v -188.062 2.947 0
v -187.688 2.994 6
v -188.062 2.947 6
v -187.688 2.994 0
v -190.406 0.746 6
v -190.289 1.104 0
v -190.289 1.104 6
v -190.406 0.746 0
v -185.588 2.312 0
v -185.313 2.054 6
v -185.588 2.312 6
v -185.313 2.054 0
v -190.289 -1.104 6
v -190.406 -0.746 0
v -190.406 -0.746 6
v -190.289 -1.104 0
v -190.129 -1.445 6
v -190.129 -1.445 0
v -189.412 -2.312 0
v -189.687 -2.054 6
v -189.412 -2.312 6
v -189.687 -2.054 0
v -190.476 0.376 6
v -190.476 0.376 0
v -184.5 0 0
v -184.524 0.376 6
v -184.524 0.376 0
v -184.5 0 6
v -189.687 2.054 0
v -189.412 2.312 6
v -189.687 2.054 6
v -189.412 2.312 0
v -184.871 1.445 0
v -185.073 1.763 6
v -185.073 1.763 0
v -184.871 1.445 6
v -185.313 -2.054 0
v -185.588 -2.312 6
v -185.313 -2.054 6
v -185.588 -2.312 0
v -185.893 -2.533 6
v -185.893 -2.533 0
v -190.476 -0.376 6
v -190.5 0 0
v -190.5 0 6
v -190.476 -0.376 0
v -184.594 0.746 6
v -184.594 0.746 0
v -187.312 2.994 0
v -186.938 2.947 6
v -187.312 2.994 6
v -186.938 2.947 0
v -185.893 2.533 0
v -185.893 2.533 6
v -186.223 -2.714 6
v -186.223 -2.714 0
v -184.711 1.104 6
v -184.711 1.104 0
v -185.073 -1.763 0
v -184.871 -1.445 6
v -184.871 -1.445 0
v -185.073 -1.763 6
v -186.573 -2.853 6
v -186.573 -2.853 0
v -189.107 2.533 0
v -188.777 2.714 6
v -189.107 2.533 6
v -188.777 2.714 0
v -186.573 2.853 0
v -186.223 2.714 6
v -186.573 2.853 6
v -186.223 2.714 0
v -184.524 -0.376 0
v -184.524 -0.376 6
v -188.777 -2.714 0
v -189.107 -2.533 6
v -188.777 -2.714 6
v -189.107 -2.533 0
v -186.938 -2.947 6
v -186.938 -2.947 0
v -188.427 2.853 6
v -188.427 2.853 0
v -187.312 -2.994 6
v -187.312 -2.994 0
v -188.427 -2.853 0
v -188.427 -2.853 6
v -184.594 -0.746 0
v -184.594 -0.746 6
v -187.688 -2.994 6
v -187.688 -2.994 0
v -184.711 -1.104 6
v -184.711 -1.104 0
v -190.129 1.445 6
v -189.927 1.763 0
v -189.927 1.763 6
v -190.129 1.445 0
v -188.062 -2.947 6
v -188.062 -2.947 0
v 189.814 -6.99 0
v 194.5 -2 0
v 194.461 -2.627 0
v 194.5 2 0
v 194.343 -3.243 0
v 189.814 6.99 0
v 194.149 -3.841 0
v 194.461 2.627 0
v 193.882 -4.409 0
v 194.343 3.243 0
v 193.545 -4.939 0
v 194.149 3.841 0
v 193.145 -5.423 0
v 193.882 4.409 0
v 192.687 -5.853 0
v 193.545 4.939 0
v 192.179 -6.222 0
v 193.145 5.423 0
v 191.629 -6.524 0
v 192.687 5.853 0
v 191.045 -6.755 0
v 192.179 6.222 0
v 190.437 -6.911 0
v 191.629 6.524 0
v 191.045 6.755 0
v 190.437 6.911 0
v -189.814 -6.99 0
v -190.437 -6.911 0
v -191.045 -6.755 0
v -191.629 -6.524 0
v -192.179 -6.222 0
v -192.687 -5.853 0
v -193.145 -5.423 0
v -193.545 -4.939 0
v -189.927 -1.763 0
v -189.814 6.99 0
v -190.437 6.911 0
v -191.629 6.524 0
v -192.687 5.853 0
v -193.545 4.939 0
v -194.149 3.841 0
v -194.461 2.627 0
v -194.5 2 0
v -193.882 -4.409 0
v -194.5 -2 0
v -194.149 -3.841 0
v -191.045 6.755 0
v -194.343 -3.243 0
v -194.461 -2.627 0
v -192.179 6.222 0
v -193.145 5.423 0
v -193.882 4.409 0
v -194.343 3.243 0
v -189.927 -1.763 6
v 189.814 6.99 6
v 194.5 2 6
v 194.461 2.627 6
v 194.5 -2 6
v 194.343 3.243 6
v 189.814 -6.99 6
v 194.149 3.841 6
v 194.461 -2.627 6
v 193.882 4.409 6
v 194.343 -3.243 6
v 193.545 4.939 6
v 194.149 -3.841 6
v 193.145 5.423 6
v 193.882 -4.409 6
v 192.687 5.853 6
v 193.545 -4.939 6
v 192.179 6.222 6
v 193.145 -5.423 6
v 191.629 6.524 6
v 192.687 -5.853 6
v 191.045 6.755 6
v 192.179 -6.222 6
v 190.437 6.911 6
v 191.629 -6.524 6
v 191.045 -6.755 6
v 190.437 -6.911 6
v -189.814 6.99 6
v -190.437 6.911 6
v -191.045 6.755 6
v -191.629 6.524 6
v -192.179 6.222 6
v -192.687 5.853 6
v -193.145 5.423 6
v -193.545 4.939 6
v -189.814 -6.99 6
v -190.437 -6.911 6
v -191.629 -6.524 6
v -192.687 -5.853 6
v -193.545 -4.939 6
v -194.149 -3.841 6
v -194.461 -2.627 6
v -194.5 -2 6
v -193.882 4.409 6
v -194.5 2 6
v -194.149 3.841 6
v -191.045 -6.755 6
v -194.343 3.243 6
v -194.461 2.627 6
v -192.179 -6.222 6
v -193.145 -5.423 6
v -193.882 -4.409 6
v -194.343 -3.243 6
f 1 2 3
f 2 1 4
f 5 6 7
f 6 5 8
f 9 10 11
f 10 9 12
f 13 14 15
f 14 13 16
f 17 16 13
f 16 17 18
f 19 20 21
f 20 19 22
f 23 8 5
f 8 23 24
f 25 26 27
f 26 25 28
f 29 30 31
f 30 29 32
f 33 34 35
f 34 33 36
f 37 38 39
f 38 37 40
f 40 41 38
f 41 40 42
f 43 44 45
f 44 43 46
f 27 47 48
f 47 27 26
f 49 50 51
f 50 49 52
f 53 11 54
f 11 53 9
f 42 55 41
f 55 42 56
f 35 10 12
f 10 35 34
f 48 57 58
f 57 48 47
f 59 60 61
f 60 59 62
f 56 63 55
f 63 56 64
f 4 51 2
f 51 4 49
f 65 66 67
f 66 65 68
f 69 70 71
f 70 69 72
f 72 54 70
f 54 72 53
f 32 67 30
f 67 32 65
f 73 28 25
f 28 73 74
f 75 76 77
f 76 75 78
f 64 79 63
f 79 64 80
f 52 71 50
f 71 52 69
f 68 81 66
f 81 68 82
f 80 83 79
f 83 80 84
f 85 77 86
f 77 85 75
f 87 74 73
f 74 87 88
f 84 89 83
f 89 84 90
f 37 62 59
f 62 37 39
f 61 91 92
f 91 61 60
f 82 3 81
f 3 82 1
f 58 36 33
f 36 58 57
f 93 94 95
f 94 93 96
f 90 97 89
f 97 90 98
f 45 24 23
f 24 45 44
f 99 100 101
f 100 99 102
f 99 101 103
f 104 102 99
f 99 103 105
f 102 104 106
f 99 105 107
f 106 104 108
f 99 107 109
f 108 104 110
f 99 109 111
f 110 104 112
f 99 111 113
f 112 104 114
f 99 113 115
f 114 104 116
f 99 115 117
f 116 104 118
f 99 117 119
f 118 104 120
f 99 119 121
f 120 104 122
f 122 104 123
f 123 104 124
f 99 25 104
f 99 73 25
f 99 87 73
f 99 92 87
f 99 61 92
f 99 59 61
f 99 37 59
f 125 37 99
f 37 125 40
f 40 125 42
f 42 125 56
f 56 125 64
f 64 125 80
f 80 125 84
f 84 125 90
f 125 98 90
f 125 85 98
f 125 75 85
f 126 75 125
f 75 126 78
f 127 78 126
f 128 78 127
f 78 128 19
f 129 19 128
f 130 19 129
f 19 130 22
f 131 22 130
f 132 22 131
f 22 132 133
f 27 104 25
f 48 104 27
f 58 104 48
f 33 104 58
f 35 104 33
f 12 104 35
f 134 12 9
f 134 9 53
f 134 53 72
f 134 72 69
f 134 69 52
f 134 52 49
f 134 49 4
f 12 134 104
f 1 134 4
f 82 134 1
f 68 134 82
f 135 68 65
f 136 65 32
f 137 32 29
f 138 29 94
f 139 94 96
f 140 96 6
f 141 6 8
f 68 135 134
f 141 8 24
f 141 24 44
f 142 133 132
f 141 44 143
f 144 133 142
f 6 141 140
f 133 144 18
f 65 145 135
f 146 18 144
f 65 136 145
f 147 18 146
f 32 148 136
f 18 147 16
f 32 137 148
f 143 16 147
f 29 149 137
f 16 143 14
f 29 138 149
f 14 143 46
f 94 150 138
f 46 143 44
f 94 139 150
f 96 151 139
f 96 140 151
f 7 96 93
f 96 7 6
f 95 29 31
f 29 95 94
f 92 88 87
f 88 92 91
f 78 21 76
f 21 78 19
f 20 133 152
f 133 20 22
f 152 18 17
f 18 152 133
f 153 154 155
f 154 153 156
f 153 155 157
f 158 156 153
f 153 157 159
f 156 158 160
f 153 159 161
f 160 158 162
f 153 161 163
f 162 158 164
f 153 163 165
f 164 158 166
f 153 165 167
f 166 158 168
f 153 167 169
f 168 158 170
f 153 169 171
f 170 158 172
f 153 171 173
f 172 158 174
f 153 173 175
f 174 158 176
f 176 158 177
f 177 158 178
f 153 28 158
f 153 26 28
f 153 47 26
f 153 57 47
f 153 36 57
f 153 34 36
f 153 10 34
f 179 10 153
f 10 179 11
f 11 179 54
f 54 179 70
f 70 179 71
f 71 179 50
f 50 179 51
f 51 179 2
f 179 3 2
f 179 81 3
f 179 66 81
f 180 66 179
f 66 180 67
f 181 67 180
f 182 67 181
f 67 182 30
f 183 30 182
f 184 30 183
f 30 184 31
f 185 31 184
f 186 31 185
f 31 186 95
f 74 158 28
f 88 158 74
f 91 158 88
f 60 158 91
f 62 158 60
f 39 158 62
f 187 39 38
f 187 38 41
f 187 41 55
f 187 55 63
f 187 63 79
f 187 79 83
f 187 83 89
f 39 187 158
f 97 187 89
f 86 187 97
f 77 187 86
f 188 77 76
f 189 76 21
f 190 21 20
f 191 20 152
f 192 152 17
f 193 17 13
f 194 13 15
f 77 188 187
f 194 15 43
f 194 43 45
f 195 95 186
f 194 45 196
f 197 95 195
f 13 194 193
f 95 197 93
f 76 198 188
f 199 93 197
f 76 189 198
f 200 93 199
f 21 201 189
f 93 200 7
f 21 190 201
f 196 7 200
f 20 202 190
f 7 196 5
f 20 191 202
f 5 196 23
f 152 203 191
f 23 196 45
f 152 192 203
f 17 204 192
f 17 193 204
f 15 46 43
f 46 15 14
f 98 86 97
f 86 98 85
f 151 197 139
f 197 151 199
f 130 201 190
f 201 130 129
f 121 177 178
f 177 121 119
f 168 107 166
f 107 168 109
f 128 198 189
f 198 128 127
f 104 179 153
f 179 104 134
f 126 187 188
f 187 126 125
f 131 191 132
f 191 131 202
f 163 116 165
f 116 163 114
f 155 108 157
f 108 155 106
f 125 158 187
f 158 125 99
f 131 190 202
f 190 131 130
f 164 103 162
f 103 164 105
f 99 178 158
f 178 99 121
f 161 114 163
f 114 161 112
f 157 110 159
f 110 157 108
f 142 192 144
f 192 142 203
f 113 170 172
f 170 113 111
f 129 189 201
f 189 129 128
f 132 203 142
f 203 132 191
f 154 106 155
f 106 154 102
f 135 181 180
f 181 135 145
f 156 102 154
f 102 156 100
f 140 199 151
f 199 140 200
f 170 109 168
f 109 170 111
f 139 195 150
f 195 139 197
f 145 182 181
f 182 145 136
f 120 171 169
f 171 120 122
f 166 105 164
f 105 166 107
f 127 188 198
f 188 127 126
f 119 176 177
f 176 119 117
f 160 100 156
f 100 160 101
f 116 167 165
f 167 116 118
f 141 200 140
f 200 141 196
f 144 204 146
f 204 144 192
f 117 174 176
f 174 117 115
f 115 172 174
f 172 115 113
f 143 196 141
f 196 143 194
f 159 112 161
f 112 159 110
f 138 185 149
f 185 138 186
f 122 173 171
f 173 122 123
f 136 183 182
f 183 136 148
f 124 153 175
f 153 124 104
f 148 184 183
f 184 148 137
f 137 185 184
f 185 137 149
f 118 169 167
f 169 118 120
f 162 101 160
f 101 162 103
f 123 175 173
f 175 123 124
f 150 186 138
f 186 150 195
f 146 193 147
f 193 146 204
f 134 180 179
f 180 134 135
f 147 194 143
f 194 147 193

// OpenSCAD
$fn = 50;


difference() {
	union() {
		hull() {
			translate(v = [-189.5000000000, 2.0000000000, 0]) {
				cylinder(h = 6, r = 5);
			}
			translate(v = [189.5000000000, 2.0000000000, 0]) {
				cylinder(h = 6, r = 5);
			}
			translate(v = [-189.5000000000, -2.0000000000, 0]) {
				cylinder(h = 6, r = 5);
			}
			translate(v = [189.5000000000, -2.0000000000, 0]) {
				cylinder(h = 6, r = 5);
			}
		}
	}
	union() {
		translate(v = [-187.5000000000, 0.0000000000, 0]) {
			cylinder(h = 6, r = 3.0000000000);
		}
		translate(v = [-187.5000000000, 0.0000000000, 0]) {
			cylinder(h = 6, r = 1.5000000000);
		}
		translate(v = [-187.5000000000, 0.0000000000, 0]) {
			cylinder(h = 6, r = 1.5000000000);
		}
		translate(v = [-187.5000000000, 0.0000000000, 0]) {
			cylinder(h = 6, r = 1.5000000000);
		}
	}
}
